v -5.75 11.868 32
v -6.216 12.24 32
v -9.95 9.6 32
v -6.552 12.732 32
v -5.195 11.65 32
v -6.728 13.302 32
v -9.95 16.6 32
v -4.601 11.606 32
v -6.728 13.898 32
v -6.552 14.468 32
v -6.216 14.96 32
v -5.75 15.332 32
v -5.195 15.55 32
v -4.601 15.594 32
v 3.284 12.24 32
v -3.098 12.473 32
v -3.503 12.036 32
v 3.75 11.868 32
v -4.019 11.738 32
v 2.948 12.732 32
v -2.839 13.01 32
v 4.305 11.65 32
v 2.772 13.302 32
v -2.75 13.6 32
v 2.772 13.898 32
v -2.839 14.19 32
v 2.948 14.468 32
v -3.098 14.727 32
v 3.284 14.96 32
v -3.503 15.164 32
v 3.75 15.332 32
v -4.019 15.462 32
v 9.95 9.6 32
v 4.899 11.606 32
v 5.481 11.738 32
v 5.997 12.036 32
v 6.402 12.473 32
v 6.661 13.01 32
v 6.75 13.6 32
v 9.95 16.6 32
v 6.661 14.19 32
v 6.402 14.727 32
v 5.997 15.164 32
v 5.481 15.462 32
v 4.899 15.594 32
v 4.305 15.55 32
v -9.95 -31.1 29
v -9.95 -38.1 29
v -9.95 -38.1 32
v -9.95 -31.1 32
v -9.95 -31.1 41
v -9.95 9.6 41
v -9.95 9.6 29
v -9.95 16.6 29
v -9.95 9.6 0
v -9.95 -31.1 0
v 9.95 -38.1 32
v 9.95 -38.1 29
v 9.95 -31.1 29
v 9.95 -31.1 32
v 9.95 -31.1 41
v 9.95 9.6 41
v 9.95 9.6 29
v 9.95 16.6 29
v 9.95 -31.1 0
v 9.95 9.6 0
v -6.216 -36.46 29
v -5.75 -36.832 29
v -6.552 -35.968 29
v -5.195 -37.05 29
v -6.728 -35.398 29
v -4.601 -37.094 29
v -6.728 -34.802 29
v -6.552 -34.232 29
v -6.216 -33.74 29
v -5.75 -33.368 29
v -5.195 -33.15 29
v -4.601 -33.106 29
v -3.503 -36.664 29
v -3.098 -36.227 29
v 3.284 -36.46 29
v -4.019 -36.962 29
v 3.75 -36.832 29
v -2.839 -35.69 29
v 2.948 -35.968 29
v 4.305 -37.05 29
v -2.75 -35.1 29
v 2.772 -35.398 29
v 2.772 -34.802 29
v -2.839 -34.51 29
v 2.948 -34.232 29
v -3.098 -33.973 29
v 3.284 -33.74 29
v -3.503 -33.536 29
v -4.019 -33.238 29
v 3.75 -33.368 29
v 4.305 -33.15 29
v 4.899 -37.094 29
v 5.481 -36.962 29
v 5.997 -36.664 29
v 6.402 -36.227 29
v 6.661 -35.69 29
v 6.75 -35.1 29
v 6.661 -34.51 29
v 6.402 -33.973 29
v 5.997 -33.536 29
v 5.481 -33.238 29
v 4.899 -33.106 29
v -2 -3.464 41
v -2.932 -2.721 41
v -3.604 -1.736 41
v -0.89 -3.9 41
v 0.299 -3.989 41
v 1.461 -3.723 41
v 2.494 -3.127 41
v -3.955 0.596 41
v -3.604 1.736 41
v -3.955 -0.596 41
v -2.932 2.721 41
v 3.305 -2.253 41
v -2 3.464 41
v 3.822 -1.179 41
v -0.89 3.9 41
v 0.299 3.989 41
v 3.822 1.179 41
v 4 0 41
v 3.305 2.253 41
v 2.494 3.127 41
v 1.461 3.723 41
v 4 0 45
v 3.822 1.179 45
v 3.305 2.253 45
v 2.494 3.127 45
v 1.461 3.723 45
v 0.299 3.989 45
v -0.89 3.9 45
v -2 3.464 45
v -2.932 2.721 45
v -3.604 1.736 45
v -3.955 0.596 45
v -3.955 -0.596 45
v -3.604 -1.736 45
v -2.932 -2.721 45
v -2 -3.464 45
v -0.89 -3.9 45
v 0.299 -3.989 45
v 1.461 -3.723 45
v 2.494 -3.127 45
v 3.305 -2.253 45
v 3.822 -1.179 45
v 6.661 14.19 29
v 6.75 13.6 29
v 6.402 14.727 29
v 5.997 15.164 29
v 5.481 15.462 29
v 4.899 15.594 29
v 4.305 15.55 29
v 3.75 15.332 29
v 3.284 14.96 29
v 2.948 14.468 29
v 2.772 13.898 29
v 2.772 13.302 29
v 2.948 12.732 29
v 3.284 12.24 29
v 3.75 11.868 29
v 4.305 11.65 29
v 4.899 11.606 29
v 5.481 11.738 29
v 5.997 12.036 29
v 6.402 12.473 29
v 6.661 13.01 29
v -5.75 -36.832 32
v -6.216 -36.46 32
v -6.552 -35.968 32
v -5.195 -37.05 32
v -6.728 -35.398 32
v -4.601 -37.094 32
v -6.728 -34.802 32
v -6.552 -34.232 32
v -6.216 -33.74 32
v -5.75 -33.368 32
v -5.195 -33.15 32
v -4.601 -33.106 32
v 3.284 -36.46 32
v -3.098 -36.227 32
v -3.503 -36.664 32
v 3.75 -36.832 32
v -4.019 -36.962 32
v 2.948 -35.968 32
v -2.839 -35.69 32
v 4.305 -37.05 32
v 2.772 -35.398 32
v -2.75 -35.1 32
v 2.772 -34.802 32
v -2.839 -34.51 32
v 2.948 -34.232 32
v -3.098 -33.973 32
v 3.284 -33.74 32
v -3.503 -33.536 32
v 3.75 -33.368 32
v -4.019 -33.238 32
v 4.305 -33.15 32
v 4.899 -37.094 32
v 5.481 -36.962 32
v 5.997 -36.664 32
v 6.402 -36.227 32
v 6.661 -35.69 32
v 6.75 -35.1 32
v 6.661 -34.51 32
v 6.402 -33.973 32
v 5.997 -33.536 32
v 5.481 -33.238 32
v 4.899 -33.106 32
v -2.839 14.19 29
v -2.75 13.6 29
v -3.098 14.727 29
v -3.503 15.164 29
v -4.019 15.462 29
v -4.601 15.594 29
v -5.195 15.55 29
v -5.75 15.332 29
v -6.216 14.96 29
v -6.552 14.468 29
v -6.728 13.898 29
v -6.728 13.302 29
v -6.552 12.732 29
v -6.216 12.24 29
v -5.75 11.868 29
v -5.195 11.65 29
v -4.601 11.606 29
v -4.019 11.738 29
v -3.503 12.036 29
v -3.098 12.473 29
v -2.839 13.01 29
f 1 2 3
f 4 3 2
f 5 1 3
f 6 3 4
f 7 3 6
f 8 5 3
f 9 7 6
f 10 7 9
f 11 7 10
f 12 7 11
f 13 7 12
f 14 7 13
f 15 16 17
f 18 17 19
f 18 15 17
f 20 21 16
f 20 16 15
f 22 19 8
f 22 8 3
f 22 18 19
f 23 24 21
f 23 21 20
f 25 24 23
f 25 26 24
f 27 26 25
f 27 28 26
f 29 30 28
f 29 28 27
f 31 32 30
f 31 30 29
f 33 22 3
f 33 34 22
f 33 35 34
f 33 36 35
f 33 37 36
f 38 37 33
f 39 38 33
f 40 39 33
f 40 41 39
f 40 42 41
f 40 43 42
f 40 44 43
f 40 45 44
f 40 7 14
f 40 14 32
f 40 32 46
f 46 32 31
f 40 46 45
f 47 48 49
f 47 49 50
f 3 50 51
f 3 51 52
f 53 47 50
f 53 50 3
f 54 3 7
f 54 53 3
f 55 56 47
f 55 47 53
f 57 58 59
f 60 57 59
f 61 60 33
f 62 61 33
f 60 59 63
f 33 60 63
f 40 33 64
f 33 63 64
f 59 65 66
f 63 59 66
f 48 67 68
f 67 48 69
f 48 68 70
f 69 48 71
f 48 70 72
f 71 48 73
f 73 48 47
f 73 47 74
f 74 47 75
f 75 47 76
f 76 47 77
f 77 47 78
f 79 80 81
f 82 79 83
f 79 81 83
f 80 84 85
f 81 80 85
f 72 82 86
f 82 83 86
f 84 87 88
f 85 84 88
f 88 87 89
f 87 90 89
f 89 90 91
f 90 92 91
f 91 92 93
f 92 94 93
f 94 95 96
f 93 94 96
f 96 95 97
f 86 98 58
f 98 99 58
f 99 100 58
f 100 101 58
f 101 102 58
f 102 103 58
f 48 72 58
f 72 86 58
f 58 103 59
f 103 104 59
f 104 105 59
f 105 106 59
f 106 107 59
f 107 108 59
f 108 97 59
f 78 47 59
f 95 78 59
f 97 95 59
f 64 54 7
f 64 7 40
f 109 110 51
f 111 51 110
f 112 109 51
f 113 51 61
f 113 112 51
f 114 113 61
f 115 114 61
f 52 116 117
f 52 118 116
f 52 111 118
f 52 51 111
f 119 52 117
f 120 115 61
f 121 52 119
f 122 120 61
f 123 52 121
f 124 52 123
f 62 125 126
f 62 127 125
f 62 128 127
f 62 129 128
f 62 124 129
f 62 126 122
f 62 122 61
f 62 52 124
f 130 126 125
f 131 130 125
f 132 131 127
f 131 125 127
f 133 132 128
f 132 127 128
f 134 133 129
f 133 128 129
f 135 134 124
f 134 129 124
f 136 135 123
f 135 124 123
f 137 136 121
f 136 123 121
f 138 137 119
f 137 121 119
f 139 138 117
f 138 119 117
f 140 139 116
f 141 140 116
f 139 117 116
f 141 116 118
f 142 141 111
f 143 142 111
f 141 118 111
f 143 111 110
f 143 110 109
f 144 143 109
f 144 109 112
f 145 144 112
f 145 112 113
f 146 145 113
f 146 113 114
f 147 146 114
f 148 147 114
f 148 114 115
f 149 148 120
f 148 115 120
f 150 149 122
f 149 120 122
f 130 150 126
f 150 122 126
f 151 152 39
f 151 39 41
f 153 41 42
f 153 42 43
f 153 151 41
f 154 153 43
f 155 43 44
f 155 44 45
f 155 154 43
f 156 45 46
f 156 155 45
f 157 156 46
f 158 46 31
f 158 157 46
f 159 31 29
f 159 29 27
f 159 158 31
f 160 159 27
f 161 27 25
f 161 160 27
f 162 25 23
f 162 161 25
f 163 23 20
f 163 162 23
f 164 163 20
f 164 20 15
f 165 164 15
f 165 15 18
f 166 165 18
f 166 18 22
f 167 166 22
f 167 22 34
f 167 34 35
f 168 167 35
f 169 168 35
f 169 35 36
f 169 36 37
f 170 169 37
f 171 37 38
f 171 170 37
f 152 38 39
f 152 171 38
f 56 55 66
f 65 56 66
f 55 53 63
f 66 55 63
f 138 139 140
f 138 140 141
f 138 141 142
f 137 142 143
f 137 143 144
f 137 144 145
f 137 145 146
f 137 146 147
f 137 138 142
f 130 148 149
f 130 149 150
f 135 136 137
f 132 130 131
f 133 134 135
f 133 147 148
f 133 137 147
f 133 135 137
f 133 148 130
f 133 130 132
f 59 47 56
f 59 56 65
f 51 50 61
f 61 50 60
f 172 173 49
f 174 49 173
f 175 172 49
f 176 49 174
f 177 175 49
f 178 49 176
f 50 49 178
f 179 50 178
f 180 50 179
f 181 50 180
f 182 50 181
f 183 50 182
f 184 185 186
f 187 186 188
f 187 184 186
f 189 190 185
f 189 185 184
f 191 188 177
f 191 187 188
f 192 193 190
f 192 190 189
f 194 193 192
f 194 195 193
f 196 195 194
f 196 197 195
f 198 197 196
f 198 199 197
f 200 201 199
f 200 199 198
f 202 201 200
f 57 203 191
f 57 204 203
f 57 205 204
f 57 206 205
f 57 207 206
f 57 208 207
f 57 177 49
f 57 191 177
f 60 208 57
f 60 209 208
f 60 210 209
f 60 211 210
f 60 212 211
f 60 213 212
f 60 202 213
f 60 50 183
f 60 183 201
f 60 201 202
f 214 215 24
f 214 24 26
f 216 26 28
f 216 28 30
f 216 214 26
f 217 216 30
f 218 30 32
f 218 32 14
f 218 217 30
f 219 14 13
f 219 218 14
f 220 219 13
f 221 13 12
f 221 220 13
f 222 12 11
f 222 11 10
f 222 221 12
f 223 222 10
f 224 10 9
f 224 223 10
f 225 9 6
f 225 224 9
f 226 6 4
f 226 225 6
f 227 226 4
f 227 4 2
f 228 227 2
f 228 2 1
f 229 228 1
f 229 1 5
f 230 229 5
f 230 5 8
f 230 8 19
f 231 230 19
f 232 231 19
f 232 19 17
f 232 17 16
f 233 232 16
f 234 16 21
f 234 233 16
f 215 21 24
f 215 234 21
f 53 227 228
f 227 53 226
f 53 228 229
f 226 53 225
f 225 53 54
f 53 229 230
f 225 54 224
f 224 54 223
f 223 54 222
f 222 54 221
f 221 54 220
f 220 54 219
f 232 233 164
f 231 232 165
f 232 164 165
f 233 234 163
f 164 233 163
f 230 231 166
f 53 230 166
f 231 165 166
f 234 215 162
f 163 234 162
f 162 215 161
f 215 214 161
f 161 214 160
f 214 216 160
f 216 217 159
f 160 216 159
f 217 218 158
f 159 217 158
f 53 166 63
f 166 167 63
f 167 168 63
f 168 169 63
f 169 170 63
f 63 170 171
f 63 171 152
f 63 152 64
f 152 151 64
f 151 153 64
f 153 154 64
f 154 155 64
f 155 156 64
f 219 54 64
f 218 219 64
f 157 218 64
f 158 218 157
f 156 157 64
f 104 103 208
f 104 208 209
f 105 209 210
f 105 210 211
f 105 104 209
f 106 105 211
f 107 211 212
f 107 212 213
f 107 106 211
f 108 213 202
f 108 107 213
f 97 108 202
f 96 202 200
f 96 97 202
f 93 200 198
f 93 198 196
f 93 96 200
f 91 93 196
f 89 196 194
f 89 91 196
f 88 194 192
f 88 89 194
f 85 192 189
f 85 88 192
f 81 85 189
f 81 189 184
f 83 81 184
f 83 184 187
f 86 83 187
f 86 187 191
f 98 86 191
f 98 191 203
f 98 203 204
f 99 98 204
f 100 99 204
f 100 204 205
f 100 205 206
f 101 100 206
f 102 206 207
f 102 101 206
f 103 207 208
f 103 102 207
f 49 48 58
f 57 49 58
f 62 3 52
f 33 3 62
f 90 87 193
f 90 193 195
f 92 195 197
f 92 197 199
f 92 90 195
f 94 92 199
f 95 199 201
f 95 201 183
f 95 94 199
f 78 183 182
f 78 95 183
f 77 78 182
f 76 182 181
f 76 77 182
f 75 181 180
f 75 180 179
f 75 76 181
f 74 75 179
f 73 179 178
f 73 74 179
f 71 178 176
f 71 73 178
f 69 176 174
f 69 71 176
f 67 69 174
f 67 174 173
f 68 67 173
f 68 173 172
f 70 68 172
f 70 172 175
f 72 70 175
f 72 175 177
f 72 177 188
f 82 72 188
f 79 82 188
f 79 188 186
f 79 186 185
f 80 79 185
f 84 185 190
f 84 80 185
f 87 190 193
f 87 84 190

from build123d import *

# Parameters (mm, degrees)
F0_W     = 19.9
F0_H     = 40.7
F1_DEPTH = 41
F3_W     = 19.9
F3_H     = 7
F3_R     = 2
F4_DEPTH = 3
F5_R     = 4
F6_DEPTH = 4


with BuildPart() as f1:
    # F0 (on Top) → F1 (new body)
    with BuildSketch(Plane.XY):
        with Locations((0, -10.75)):
            Rectangle(F0_W, F0_H)
    extrude(amount=F1_DEPTH)

    # F3 (on offset) → F4 (join)
    with BuildSketch(Plane.XY.offset(29)):
        with Locations((0, 13.1)):
            Rectangle(F3_W, F3_H)
        with Locations((-4.75, 13.6)):
            Circle(F3_R, mode=Mode.SUBTRACT)
        with Locations((4.75, 13.6)):
            Circle(F3_R, mode=Mode.SUBTRACT)
        with Locations((0, -34.6)):
            Rectangle(F3_W, F3_H)
        with Locations((-4.75, -35.1)):
            Circle(F3_R, mode=Mode.SUBTRACT)
        with Locations((4.75, -35.1)):
            Circle(F3_R, mode=Mode.SUBTRACT)
    extrude(amount=F4_DEPTH)

    # F5 (on face) → F6 (join)
    with BuildSketch(Plane.XY.offset(41)):
        Circle(F5_R)
    extrude(amount=F6_DEPTH)


solid = f1.part
